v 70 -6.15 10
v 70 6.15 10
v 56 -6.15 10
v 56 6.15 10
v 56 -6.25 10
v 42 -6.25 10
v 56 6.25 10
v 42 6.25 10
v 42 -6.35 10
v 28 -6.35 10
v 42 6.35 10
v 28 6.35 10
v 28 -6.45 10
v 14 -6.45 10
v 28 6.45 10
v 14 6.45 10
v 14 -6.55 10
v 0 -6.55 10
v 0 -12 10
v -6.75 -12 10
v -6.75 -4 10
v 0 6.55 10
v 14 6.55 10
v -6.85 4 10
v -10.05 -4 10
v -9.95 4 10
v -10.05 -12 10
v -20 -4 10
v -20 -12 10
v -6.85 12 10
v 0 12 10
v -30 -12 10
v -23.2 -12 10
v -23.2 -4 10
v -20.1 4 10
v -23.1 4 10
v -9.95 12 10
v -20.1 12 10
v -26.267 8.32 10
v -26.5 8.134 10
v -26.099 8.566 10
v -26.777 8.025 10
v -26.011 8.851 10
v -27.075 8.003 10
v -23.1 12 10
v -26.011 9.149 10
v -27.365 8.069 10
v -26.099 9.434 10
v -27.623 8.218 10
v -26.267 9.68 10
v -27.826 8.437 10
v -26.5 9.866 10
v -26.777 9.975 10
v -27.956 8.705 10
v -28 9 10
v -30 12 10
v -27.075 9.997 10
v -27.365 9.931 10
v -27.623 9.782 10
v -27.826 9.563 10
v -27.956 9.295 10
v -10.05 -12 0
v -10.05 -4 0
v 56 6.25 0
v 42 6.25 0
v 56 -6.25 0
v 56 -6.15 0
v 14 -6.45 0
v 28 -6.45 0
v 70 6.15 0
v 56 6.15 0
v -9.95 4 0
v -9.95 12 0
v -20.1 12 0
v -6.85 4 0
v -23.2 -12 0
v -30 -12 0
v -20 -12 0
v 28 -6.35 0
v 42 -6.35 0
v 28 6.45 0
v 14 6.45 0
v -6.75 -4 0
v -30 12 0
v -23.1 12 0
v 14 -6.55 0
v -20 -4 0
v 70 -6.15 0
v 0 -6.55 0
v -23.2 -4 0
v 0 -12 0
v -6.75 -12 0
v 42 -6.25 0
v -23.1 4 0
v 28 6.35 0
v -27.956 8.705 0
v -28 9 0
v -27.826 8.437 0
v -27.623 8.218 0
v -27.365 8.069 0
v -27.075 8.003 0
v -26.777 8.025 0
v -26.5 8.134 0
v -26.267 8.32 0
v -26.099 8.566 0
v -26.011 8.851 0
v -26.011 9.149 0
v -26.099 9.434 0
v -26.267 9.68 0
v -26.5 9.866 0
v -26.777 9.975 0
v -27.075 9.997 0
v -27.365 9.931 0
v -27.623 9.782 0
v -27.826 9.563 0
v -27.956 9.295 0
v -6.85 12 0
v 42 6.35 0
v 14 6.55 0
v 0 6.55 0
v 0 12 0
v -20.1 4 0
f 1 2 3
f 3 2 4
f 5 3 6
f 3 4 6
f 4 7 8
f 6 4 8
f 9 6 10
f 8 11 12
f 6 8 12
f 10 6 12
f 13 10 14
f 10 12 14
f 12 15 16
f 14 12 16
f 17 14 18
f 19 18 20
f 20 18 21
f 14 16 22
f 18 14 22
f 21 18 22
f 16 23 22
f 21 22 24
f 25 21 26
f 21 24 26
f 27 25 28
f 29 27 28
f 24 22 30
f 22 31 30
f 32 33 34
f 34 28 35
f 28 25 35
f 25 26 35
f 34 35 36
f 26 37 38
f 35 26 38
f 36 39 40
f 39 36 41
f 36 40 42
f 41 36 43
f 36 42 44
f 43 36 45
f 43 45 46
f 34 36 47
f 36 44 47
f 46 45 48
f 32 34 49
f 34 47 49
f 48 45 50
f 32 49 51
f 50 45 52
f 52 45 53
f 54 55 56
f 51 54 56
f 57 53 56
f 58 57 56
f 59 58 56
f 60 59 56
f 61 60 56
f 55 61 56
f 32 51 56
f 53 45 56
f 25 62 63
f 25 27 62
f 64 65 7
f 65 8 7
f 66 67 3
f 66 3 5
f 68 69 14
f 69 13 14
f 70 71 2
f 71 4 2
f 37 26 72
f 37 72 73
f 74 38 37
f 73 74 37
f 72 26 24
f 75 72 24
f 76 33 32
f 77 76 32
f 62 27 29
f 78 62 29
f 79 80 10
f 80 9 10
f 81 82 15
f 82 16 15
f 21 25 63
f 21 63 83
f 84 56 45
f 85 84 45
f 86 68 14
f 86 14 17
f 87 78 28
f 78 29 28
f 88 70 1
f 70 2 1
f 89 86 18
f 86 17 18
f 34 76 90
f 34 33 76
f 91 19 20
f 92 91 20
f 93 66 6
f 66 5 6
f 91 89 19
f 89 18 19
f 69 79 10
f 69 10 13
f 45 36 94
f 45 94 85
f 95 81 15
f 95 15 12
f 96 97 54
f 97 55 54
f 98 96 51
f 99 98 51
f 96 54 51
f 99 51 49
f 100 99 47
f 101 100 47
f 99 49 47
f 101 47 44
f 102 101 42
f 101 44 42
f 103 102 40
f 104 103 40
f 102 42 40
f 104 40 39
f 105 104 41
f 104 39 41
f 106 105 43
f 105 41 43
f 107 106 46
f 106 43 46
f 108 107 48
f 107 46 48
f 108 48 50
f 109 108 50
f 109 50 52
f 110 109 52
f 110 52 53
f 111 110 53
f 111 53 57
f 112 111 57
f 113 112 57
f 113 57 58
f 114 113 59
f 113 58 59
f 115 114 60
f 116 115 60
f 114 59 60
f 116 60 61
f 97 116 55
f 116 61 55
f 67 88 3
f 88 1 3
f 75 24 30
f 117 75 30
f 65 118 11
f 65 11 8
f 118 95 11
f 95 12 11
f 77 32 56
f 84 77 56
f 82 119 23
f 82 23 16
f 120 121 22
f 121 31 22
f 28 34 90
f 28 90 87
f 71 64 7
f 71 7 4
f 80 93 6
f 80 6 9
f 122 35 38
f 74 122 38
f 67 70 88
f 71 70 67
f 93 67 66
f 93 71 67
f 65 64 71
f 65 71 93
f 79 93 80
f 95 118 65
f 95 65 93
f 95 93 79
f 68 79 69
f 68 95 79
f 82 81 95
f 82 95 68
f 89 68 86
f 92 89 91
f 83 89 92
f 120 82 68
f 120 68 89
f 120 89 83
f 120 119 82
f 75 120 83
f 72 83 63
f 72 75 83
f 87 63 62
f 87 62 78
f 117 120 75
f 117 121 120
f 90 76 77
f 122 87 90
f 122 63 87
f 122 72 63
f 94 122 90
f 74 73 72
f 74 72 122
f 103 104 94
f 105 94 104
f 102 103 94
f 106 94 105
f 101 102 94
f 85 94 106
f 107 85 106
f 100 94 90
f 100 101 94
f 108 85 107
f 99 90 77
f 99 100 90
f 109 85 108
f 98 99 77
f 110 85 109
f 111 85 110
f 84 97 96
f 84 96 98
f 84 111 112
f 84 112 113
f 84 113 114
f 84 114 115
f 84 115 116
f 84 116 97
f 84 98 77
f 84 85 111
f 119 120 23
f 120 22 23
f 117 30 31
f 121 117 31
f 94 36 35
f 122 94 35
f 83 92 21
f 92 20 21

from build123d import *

# Parameters (mm, degrees)
GAUGE_BODY_DEPTH   = 5
NOTCH_3_0_SKETCH_W = 3
NOTCH_3_0_SKETCH_H = 9
NOTCH_3_0_DEPTH    = 6
NOTCH_3_1_SKETCH_W = 3.1
NOTCH_3_1_SKETCH_H = 9
NOTCH_3_1_DEPTH    = 6
NOTCH_3_2_SKETCH_W = 3.2
NOTCH_3_2_SKETCH_H = 9
NOTCH_3_2_DEPTH    = 6
NOTCH_3_3_SKETCH_W = 3.3
NOTCH_3_3_SKETCH_H = 9
NOTCH_3_3_DEPTH    = 6
MARK_HOLE_SKETCH_R = 1
MARK_HOLE_DEPTH    = 6


with BuildPart() as part:
    # gauge body sketch → gauge body (new, symmetric)
    with BuildSketch(Plane.XY.offset(5)):
        Polygon((-30, 12), (0, 12), (0, 6.55), (14, 6.55), (14, 6.45), (28, 6.45), (28, 6.35), (42, 6.35), (42, 6.25), (56, 6.25), (56, 6.15), (70, 6.15), (70, -6.15), (56, -6.15), (56, -6.25), (42, -6.25), (42, -6.35), (28, -6.35), (28, -6.45), (14, -6.45), (14, -6.55), (0, -6.55), (0, -12), (-30, -12), align=None)
    extrude(amount=GAUGE_BODY_DEPTH, both=True)

    # notch 3.0 sketch → notch 3.0 (cut, symmetric)
    with BuildSketch(Plane.XY.offset(5)):
        with Locations((-21.6, 8.5)):
            Rectangle(NOTCH_3_0_SKETCH_W, NOTCH_3_0_SKETCH_H)
    extrude(amount=NOTCH_3_0_DEPTH, both=True, mode=Mode.SUBTRACT)

    # notch 3.1 sketch → notch 3.1 (cut, symmetric)
    with BuildSketch(Plane.XY.offset(5)):
        with Locations((-8.4, 8.5)):
            Rectangle(NOTCH_3_1_SKETCH_W, NOTCH_3_1_SKETCH_H)
    extrude(amount=NOTCH_3_1_DEPTH, both=True, mode=Mode.SUBTRACT)

    # notch 3.2 sketch → notch 3.2 (cut, symmetric)
    with BuildSketch(Plane.XY.offset(5)):
        with Locations((-21.6, -8.5)):
            Rectangle(NOTCH_3_2_SKETCH_W, NOTCH_3_2_SKETCH_H)
    extrude(amount=NOTCH_3_2_DEPTH, both=True, mode=Mode.SUBTRACT)

    # notch 3.3 sketch → notch 3.3 (cut, symmetric)
    with BuildSketch(Plane.XY.offset(5)):
        with Locations((-8.4, -8.5)):
            Rectangle(NOTCH_3_3_SKETCH_W, NOTCH_3_3_SKETCH_H)
    extrude(amount=NOTCH_3_3_DEPTH, both=True, mode=Mode.SUBTRACT)

    # mark hole sketch → mark hole (cut, symmetric)
    with BuildSketch(Plane.XY.offset(5)):
        with Locations(Location((-27, 9, 0), (0, 0, 180))):
            Circle(MARK_HOLE_SKETCH_R)
    extrude(amount=MARK_HOLE_DEPTH, both=True, mode=Mode.SUBTRACT)


solid = part.part
